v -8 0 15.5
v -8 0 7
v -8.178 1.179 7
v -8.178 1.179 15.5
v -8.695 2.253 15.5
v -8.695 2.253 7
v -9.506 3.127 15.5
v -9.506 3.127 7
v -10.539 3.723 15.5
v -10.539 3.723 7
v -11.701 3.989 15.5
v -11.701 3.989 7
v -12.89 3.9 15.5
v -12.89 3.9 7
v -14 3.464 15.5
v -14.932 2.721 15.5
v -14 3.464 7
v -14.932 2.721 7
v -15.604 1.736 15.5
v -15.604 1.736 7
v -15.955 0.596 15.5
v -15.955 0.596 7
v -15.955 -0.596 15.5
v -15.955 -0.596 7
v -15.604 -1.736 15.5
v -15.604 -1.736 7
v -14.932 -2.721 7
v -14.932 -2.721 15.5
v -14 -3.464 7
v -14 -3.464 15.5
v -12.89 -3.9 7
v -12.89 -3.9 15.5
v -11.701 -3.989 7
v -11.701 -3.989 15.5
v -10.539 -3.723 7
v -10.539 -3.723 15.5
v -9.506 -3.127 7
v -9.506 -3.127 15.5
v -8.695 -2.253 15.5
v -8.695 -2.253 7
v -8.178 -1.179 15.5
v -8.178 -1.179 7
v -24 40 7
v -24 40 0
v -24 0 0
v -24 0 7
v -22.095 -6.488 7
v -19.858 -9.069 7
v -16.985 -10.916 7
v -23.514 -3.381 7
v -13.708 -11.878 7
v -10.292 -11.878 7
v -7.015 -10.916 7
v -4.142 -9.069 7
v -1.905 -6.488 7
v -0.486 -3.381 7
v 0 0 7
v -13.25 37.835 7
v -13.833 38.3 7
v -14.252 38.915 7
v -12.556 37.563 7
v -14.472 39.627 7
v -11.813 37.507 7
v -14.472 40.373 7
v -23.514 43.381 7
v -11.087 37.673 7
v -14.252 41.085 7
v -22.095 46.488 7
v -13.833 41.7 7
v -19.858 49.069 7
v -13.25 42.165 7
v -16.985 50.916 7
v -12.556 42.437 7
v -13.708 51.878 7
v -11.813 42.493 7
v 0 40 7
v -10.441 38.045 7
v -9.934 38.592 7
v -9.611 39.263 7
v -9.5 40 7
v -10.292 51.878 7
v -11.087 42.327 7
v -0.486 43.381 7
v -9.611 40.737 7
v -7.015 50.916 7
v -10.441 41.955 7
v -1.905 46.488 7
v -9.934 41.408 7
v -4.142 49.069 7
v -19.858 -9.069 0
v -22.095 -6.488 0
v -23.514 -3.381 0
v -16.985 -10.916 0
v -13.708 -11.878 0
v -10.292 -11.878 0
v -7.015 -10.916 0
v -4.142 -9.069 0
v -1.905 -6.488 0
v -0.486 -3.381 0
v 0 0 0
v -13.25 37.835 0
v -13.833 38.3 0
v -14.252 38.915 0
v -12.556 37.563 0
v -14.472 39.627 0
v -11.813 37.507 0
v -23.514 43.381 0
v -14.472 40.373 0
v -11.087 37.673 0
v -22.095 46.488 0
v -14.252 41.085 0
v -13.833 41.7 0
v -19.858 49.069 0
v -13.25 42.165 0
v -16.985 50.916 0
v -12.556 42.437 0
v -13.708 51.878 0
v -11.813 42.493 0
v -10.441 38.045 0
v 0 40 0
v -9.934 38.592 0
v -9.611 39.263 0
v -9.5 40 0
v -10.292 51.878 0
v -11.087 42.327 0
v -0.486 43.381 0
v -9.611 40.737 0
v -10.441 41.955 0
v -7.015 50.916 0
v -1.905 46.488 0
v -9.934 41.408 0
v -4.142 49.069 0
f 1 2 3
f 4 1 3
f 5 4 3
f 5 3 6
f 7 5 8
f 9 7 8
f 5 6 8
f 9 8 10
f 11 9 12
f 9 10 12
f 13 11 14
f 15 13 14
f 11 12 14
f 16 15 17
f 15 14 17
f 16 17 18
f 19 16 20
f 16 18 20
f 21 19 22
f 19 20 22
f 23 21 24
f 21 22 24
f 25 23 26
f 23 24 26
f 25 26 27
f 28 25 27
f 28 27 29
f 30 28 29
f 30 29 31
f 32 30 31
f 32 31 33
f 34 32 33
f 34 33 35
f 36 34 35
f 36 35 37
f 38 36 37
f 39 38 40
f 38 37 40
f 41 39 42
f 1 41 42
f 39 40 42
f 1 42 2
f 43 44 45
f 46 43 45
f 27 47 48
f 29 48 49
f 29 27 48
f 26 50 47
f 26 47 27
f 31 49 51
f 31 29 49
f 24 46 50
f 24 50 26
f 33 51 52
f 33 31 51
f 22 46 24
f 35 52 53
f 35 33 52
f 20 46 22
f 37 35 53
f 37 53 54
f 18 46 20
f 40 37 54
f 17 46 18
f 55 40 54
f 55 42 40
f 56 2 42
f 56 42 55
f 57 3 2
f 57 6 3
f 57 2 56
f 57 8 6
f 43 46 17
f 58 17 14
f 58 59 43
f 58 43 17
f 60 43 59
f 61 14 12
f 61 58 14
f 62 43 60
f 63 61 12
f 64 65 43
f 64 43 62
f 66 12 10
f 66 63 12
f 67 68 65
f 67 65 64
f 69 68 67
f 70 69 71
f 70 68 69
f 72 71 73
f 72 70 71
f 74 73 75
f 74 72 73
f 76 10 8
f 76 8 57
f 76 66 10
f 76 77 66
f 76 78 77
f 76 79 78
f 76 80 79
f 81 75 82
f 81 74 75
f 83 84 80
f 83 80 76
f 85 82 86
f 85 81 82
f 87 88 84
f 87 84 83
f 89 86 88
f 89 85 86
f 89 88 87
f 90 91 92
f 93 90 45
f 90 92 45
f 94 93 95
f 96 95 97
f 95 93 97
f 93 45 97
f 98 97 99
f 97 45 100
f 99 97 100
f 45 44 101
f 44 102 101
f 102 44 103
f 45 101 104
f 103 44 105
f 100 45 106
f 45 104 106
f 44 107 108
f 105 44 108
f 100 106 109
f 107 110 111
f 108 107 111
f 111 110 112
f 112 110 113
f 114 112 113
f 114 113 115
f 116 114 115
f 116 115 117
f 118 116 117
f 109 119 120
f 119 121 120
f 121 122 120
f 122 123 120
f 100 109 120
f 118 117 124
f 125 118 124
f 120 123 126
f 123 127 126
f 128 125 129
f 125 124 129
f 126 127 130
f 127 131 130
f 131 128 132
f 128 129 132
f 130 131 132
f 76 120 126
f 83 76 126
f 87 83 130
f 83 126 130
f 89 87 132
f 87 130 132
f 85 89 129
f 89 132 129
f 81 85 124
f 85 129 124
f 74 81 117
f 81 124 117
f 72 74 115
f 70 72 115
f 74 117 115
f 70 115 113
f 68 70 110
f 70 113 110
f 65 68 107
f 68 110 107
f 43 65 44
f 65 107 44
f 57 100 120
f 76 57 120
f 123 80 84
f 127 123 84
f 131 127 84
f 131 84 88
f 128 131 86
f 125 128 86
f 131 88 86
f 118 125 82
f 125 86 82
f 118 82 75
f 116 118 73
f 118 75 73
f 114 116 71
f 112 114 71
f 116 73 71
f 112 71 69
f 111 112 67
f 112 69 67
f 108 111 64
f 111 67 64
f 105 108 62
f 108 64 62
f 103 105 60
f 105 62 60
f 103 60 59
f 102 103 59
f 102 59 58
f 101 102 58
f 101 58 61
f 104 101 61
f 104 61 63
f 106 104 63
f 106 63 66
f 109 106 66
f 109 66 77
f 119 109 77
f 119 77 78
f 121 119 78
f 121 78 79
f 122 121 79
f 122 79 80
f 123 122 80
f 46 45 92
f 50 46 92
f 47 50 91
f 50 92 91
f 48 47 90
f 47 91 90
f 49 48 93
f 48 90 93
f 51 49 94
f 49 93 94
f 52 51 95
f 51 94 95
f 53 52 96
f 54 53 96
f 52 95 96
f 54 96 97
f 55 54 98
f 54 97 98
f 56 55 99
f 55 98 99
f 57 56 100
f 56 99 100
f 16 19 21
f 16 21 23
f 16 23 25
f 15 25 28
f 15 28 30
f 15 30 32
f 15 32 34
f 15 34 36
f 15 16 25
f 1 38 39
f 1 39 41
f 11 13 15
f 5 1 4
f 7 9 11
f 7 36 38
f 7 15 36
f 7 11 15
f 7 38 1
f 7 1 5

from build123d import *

# Parameters (mm, degrees)
BOSS_EXTRUDE1_DEPTH = 7
SKETCH2_R           = 4
BOSS_EXTRUDE2_DEPTH = 8.5
SKETCH3_R           = 2.5
CUT_EXTRUDE1_DEPTH  = 10.5


with BuildPart() as part:
    # Sketch1 → Boss-Extrude1 (new body)
    with BuildSketch(Plane.XY):
        with BuildLine():
            Line((0, 0), (0, 40))
            ThreePointArc((0, 40), (-12, 52), (-24, 40))
            Line((-24, 40), (-24, 0))
            ThreePointArc((-24, 0), (-12, -12), (0, 0))
        make_face()
    extrude(amount=BOSS_EXTRUDE1_DEPTH)

    # Sketch2 → Boss-Extrude2 (add)
    with BuildSketch(Plane.XY.offset(7)):
        with Locations((-12, 0)):
            Circle(SKETCH2_R)
    extrude(amount=BOSS_EXTRUDE2_DEPTH)

    # Sketch3 → Cut-Extrude1 (cut)
    with BuildSketch(Plane.XY.offset(7)):
        with Locations((-12, 40)):
            Circle(SKETCH3_R)
    extrude(amount=-CUT_EXTRUDE1_DEPTH, mode=Mode.SUBTRACT)


solid = part.part
